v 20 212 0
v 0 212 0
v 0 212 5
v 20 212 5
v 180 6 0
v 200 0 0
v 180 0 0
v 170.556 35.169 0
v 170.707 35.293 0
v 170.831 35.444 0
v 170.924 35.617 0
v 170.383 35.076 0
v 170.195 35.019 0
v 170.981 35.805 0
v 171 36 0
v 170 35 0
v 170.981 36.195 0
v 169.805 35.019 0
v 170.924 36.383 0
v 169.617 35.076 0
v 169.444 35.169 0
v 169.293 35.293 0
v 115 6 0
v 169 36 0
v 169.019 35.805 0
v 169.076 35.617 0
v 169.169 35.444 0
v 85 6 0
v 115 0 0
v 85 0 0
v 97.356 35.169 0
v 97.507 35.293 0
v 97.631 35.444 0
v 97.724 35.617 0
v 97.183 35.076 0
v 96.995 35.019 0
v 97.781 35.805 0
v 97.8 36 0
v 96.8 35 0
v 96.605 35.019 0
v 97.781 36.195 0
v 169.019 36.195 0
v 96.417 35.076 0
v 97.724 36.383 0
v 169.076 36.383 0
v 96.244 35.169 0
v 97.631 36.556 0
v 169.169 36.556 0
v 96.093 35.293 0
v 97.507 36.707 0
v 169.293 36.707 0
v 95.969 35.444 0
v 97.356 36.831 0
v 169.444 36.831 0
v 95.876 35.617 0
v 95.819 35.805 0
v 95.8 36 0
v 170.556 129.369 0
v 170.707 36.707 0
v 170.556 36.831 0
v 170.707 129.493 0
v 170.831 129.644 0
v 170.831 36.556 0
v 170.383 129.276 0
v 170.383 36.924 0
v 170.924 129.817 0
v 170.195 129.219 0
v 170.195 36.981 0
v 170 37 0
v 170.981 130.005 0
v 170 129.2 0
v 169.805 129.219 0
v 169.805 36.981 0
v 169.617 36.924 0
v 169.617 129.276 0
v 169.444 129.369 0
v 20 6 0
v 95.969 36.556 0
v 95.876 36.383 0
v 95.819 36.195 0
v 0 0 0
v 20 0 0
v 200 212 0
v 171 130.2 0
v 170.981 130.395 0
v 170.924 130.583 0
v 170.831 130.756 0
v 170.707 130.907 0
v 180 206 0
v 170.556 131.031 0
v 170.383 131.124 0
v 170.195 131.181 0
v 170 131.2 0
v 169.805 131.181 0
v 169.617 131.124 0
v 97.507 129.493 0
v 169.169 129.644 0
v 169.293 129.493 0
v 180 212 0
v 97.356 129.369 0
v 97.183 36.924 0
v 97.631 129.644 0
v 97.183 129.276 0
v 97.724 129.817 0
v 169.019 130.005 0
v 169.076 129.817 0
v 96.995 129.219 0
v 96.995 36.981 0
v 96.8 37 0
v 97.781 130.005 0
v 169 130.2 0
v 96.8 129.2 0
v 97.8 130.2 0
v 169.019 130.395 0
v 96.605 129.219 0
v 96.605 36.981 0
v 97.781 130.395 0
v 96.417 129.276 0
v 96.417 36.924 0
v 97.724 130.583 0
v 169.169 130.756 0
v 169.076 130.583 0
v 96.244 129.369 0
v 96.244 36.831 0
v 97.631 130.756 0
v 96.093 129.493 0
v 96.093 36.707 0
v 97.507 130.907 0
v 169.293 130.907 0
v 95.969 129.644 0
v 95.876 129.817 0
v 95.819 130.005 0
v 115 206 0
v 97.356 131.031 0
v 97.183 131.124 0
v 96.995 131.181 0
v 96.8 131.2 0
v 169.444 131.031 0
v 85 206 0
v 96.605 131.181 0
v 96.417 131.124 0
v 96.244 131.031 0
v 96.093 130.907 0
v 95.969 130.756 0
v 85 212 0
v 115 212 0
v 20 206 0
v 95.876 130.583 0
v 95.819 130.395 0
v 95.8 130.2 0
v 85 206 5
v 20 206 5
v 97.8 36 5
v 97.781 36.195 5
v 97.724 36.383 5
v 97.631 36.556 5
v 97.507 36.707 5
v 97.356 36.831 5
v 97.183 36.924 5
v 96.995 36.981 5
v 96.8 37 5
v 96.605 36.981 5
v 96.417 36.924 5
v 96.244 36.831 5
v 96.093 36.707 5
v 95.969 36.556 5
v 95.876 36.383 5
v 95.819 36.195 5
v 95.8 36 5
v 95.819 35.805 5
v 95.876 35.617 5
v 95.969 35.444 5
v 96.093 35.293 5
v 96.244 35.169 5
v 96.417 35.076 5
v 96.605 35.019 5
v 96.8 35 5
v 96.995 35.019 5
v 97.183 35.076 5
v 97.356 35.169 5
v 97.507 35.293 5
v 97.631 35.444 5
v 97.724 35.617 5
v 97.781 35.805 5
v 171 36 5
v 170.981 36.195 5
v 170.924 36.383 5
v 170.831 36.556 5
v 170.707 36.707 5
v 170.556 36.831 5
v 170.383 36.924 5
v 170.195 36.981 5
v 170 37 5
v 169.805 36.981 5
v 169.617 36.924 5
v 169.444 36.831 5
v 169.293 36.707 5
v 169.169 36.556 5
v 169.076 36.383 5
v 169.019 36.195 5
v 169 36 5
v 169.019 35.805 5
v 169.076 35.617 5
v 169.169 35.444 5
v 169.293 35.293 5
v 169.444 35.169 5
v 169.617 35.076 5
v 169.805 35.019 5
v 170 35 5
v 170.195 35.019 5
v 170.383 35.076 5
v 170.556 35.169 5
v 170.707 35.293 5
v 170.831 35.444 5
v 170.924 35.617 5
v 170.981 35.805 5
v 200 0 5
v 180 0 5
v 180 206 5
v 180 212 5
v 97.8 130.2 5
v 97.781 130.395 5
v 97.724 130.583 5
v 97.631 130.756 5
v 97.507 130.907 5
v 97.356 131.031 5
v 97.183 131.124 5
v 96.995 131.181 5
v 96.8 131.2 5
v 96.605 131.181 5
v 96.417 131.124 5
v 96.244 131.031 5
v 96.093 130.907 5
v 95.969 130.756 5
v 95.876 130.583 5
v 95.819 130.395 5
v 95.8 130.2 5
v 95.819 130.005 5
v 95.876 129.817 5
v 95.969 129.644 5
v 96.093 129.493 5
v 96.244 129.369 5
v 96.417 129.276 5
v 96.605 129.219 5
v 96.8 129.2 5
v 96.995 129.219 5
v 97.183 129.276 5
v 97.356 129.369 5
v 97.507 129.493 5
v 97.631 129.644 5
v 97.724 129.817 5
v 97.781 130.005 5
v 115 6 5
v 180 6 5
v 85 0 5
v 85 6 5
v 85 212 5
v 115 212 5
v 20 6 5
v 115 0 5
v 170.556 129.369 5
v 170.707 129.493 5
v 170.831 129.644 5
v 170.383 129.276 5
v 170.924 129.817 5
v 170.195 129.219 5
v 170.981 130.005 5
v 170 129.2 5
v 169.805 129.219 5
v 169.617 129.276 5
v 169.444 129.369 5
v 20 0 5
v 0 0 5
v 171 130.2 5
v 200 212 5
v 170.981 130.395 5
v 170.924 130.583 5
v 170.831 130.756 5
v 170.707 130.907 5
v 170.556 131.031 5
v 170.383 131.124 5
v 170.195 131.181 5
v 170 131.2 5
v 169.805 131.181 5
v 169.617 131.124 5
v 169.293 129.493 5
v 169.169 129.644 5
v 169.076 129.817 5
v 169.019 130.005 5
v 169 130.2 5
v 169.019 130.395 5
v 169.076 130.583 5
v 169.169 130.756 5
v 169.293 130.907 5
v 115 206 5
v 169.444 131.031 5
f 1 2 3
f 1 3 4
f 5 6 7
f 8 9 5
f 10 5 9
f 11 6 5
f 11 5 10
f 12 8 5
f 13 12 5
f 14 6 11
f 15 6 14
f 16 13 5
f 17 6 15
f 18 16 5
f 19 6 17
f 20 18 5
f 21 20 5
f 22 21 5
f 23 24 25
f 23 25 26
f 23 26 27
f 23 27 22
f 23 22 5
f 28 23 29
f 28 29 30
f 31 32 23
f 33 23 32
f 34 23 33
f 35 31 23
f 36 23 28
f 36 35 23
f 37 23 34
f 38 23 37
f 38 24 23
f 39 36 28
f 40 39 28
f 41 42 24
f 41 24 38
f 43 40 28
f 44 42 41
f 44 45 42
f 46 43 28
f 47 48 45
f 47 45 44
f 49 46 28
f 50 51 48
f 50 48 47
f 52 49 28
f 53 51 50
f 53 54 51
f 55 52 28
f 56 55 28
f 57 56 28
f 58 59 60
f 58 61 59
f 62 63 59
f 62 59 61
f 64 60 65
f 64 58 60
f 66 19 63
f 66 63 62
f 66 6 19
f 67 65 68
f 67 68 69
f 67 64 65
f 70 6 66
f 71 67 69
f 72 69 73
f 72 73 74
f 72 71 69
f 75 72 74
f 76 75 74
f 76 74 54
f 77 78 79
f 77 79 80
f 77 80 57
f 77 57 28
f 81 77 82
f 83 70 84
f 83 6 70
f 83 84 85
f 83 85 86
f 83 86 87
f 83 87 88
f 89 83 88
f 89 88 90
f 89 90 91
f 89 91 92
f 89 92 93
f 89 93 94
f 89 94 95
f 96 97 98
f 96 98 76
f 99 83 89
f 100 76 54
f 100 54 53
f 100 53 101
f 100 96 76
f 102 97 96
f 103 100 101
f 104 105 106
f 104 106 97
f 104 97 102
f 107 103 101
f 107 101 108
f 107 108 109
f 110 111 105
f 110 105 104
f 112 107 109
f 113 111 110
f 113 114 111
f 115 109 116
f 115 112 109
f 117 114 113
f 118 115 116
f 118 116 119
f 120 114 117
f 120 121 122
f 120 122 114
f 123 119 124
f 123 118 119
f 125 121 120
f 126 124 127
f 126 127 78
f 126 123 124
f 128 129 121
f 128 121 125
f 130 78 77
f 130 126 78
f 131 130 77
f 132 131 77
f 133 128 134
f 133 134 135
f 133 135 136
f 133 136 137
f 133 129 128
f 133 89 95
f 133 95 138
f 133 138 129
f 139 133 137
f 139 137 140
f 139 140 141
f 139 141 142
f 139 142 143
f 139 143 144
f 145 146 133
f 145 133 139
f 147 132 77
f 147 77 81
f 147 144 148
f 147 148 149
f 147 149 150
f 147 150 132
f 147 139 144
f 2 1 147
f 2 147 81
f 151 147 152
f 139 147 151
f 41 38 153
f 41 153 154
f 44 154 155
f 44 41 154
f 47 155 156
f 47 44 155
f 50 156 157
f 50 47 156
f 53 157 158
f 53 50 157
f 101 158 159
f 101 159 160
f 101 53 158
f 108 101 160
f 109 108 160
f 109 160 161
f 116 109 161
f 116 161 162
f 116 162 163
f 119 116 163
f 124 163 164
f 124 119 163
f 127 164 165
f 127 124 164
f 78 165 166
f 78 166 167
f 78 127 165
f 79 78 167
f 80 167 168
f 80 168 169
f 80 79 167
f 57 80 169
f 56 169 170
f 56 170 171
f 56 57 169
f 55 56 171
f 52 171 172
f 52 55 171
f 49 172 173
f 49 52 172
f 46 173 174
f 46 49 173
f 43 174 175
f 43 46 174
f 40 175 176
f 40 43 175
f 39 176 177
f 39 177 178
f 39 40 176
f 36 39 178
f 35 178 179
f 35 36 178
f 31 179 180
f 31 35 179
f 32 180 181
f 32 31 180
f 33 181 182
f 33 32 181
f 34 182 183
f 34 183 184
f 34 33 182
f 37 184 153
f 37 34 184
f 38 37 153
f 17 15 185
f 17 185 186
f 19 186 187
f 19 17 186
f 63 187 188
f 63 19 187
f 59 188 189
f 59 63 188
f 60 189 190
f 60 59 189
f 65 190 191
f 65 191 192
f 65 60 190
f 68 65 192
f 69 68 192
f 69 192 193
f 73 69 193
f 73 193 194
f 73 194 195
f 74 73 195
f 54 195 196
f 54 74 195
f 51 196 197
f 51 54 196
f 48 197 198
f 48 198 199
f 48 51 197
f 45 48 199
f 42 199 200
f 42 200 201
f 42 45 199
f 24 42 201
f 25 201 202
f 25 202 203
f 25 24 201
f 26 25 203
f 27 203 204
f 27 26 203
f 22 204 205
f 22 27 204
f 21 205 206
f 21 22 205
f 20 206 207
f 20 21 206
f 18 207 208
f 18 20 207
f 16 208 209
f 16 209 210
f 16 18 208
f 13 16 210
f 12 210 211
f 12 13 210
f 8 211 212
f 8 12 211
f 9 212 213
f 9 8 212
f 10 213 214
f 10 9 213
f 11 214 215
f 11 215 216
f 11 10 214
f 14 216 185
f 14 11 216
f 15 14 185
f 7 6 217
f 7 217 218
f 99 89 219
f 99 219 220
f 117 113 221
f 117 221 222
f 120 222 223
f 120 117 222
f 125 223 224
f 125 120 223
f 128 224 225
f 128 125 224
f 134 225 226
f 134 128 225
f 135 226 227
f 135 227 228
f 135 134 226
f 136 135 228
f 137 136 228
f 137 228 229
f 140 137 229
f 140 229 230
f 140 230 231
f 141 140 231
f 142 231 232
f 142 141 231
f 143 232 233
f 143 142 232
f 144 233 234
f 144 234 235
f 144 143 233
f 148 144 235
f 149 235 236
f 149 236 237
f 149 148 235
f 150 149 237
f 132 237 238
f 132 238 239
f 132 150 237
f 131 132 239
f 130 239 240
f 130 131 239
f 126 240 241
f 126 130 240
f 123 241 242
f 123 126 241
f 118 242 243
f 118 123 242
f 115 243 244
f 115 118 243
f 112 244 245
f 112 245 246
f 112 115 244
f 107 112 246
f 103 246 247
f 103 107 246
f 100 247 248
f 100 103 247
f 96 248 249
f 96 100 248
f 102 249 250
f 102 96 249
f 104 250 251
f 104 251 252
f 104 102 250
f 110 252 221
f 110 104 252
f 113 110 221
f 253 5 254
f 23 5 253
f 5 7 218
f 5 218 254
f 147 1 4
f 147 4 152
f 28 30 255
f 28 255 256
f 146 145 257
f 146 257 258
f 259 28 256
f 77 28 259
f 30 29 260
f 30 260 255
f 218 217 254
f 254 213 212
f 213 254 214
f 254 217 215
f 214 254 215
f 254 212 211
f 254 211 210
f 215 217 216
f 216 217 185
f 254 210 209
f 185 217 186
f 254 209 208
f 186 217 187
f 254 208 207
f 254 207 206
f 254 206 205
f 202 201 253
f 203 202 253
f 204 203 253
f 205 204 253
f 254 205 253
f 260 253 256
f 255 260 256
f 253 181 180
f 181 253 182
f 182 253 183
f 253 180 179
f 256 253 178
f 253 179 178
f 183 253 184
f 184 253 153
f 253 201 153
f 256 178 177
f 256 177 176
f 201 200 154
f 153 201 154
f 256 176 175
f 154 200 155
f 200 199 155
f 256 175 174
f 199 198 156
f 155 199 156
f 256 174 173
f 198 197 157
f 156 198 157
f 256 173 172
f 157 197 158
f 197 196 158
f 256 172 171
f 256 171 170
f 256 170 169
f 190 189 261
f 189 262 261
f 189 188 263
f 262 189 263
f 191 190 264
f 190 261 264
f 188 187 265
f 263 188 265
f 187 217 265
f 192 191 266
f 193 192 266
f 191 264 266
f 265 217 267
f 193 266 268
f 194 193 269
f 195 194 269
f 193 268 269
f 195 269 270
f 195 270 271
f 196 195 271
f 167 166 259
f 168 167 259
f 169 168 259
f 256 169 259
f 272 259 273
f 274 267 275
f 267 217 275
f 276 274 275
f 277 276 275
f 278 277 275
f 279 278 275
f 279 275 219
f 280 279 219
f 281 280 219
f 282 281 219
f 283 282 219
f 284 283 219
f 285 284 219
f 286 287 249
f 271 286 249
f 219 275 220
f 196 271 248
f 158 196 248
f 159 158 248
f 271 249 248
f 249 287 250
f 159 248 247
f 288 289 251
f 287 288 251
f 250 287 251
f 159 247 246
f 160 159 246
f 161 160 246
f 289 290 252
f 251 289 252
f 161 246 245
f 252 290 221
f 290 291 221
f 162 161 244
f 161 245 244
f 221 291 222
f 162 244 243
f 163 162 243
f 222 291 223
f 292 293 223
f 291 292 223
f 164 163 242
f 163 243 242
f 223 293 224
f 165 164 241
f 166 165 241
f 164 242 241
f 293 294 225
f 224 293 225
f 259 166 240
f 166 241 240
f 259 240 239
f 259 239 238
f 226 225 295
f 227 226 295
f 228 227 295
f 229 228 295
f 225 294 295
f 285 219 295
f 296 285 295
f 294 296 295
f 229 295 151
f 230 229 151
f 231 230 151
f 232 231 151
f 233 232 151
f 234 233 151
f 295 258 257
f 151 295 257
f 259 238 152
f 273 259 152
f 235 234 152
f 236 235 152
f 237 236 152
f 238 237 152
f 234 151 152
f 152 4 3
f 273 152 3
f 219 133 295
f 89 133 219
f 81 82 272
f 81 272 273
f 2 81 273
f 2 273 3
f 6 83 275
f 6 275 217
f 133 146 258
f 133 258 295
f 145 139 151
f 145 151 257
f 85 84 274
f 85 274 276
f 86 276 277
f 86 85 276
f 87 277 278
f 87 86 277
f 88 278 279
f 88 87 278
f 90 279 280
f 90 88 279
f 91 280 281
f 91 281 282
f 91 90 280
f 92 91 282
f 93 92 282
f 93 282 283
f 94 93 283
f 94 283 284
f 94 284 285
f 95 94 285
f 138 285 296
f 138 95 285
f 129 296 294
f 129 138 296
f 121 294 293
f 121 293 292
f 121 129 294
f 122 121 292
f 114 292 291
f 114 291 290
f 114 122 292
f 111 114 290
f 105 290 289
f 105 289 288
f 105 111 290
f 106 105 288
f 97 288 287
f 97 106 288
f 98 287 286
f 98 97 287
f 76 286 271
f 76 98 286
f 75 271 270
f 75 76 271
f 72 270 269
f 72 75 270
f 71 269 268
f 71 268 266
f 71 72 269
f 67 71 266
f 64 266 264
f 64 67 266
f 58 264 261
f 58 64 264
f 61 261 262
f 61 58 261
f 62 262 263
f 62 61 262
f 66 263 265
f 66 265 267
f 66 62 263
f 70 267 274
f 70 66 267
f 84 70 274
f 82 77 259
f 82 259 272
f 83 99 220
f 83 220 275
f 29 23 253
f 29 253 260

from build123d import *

# Parameters (mm, degrees)
ESQUISSE1_R        = 1
BOSS_EXTRU_1_DEPTH = 5


with BuildPart() as part:
    # Esquisse1 → Boss.-Extru.1 (new body)
    with BuildSketch(Plane.XY):
        Polygon((0, 0), (0, 212), (20, 212), (20, 206), (85, 206), (85, 212), (115, 212), (115, 206), (180, 206), (180, 212), (200, 212), (200, 0), (180, 0), (180, 6), (115, 6), (115, 0), (85, 0), (85, 6), (20, 6), (20, 0), align=None)
        with Locations((170, 36)):
            Circle(ESQUISSE1_R, mode=Mode.SUBTRACT)
        with Locations((96.8, 36)):
            Circle(ESQUISSE1_R, mode=Mode.SUBTRACT)
        with Locations((96.8, 130.2)):
            Circle(ESQUISSE1_R, mode=Mode.SUBTRACT)
        with Locations((170, 130.2)):
            Circle(ESQUISSE1_R, mode=Mode.SUBTRACT)
    extrude(amount=BOSS_EXTRU_1_DEPTH)


solid = part.part
